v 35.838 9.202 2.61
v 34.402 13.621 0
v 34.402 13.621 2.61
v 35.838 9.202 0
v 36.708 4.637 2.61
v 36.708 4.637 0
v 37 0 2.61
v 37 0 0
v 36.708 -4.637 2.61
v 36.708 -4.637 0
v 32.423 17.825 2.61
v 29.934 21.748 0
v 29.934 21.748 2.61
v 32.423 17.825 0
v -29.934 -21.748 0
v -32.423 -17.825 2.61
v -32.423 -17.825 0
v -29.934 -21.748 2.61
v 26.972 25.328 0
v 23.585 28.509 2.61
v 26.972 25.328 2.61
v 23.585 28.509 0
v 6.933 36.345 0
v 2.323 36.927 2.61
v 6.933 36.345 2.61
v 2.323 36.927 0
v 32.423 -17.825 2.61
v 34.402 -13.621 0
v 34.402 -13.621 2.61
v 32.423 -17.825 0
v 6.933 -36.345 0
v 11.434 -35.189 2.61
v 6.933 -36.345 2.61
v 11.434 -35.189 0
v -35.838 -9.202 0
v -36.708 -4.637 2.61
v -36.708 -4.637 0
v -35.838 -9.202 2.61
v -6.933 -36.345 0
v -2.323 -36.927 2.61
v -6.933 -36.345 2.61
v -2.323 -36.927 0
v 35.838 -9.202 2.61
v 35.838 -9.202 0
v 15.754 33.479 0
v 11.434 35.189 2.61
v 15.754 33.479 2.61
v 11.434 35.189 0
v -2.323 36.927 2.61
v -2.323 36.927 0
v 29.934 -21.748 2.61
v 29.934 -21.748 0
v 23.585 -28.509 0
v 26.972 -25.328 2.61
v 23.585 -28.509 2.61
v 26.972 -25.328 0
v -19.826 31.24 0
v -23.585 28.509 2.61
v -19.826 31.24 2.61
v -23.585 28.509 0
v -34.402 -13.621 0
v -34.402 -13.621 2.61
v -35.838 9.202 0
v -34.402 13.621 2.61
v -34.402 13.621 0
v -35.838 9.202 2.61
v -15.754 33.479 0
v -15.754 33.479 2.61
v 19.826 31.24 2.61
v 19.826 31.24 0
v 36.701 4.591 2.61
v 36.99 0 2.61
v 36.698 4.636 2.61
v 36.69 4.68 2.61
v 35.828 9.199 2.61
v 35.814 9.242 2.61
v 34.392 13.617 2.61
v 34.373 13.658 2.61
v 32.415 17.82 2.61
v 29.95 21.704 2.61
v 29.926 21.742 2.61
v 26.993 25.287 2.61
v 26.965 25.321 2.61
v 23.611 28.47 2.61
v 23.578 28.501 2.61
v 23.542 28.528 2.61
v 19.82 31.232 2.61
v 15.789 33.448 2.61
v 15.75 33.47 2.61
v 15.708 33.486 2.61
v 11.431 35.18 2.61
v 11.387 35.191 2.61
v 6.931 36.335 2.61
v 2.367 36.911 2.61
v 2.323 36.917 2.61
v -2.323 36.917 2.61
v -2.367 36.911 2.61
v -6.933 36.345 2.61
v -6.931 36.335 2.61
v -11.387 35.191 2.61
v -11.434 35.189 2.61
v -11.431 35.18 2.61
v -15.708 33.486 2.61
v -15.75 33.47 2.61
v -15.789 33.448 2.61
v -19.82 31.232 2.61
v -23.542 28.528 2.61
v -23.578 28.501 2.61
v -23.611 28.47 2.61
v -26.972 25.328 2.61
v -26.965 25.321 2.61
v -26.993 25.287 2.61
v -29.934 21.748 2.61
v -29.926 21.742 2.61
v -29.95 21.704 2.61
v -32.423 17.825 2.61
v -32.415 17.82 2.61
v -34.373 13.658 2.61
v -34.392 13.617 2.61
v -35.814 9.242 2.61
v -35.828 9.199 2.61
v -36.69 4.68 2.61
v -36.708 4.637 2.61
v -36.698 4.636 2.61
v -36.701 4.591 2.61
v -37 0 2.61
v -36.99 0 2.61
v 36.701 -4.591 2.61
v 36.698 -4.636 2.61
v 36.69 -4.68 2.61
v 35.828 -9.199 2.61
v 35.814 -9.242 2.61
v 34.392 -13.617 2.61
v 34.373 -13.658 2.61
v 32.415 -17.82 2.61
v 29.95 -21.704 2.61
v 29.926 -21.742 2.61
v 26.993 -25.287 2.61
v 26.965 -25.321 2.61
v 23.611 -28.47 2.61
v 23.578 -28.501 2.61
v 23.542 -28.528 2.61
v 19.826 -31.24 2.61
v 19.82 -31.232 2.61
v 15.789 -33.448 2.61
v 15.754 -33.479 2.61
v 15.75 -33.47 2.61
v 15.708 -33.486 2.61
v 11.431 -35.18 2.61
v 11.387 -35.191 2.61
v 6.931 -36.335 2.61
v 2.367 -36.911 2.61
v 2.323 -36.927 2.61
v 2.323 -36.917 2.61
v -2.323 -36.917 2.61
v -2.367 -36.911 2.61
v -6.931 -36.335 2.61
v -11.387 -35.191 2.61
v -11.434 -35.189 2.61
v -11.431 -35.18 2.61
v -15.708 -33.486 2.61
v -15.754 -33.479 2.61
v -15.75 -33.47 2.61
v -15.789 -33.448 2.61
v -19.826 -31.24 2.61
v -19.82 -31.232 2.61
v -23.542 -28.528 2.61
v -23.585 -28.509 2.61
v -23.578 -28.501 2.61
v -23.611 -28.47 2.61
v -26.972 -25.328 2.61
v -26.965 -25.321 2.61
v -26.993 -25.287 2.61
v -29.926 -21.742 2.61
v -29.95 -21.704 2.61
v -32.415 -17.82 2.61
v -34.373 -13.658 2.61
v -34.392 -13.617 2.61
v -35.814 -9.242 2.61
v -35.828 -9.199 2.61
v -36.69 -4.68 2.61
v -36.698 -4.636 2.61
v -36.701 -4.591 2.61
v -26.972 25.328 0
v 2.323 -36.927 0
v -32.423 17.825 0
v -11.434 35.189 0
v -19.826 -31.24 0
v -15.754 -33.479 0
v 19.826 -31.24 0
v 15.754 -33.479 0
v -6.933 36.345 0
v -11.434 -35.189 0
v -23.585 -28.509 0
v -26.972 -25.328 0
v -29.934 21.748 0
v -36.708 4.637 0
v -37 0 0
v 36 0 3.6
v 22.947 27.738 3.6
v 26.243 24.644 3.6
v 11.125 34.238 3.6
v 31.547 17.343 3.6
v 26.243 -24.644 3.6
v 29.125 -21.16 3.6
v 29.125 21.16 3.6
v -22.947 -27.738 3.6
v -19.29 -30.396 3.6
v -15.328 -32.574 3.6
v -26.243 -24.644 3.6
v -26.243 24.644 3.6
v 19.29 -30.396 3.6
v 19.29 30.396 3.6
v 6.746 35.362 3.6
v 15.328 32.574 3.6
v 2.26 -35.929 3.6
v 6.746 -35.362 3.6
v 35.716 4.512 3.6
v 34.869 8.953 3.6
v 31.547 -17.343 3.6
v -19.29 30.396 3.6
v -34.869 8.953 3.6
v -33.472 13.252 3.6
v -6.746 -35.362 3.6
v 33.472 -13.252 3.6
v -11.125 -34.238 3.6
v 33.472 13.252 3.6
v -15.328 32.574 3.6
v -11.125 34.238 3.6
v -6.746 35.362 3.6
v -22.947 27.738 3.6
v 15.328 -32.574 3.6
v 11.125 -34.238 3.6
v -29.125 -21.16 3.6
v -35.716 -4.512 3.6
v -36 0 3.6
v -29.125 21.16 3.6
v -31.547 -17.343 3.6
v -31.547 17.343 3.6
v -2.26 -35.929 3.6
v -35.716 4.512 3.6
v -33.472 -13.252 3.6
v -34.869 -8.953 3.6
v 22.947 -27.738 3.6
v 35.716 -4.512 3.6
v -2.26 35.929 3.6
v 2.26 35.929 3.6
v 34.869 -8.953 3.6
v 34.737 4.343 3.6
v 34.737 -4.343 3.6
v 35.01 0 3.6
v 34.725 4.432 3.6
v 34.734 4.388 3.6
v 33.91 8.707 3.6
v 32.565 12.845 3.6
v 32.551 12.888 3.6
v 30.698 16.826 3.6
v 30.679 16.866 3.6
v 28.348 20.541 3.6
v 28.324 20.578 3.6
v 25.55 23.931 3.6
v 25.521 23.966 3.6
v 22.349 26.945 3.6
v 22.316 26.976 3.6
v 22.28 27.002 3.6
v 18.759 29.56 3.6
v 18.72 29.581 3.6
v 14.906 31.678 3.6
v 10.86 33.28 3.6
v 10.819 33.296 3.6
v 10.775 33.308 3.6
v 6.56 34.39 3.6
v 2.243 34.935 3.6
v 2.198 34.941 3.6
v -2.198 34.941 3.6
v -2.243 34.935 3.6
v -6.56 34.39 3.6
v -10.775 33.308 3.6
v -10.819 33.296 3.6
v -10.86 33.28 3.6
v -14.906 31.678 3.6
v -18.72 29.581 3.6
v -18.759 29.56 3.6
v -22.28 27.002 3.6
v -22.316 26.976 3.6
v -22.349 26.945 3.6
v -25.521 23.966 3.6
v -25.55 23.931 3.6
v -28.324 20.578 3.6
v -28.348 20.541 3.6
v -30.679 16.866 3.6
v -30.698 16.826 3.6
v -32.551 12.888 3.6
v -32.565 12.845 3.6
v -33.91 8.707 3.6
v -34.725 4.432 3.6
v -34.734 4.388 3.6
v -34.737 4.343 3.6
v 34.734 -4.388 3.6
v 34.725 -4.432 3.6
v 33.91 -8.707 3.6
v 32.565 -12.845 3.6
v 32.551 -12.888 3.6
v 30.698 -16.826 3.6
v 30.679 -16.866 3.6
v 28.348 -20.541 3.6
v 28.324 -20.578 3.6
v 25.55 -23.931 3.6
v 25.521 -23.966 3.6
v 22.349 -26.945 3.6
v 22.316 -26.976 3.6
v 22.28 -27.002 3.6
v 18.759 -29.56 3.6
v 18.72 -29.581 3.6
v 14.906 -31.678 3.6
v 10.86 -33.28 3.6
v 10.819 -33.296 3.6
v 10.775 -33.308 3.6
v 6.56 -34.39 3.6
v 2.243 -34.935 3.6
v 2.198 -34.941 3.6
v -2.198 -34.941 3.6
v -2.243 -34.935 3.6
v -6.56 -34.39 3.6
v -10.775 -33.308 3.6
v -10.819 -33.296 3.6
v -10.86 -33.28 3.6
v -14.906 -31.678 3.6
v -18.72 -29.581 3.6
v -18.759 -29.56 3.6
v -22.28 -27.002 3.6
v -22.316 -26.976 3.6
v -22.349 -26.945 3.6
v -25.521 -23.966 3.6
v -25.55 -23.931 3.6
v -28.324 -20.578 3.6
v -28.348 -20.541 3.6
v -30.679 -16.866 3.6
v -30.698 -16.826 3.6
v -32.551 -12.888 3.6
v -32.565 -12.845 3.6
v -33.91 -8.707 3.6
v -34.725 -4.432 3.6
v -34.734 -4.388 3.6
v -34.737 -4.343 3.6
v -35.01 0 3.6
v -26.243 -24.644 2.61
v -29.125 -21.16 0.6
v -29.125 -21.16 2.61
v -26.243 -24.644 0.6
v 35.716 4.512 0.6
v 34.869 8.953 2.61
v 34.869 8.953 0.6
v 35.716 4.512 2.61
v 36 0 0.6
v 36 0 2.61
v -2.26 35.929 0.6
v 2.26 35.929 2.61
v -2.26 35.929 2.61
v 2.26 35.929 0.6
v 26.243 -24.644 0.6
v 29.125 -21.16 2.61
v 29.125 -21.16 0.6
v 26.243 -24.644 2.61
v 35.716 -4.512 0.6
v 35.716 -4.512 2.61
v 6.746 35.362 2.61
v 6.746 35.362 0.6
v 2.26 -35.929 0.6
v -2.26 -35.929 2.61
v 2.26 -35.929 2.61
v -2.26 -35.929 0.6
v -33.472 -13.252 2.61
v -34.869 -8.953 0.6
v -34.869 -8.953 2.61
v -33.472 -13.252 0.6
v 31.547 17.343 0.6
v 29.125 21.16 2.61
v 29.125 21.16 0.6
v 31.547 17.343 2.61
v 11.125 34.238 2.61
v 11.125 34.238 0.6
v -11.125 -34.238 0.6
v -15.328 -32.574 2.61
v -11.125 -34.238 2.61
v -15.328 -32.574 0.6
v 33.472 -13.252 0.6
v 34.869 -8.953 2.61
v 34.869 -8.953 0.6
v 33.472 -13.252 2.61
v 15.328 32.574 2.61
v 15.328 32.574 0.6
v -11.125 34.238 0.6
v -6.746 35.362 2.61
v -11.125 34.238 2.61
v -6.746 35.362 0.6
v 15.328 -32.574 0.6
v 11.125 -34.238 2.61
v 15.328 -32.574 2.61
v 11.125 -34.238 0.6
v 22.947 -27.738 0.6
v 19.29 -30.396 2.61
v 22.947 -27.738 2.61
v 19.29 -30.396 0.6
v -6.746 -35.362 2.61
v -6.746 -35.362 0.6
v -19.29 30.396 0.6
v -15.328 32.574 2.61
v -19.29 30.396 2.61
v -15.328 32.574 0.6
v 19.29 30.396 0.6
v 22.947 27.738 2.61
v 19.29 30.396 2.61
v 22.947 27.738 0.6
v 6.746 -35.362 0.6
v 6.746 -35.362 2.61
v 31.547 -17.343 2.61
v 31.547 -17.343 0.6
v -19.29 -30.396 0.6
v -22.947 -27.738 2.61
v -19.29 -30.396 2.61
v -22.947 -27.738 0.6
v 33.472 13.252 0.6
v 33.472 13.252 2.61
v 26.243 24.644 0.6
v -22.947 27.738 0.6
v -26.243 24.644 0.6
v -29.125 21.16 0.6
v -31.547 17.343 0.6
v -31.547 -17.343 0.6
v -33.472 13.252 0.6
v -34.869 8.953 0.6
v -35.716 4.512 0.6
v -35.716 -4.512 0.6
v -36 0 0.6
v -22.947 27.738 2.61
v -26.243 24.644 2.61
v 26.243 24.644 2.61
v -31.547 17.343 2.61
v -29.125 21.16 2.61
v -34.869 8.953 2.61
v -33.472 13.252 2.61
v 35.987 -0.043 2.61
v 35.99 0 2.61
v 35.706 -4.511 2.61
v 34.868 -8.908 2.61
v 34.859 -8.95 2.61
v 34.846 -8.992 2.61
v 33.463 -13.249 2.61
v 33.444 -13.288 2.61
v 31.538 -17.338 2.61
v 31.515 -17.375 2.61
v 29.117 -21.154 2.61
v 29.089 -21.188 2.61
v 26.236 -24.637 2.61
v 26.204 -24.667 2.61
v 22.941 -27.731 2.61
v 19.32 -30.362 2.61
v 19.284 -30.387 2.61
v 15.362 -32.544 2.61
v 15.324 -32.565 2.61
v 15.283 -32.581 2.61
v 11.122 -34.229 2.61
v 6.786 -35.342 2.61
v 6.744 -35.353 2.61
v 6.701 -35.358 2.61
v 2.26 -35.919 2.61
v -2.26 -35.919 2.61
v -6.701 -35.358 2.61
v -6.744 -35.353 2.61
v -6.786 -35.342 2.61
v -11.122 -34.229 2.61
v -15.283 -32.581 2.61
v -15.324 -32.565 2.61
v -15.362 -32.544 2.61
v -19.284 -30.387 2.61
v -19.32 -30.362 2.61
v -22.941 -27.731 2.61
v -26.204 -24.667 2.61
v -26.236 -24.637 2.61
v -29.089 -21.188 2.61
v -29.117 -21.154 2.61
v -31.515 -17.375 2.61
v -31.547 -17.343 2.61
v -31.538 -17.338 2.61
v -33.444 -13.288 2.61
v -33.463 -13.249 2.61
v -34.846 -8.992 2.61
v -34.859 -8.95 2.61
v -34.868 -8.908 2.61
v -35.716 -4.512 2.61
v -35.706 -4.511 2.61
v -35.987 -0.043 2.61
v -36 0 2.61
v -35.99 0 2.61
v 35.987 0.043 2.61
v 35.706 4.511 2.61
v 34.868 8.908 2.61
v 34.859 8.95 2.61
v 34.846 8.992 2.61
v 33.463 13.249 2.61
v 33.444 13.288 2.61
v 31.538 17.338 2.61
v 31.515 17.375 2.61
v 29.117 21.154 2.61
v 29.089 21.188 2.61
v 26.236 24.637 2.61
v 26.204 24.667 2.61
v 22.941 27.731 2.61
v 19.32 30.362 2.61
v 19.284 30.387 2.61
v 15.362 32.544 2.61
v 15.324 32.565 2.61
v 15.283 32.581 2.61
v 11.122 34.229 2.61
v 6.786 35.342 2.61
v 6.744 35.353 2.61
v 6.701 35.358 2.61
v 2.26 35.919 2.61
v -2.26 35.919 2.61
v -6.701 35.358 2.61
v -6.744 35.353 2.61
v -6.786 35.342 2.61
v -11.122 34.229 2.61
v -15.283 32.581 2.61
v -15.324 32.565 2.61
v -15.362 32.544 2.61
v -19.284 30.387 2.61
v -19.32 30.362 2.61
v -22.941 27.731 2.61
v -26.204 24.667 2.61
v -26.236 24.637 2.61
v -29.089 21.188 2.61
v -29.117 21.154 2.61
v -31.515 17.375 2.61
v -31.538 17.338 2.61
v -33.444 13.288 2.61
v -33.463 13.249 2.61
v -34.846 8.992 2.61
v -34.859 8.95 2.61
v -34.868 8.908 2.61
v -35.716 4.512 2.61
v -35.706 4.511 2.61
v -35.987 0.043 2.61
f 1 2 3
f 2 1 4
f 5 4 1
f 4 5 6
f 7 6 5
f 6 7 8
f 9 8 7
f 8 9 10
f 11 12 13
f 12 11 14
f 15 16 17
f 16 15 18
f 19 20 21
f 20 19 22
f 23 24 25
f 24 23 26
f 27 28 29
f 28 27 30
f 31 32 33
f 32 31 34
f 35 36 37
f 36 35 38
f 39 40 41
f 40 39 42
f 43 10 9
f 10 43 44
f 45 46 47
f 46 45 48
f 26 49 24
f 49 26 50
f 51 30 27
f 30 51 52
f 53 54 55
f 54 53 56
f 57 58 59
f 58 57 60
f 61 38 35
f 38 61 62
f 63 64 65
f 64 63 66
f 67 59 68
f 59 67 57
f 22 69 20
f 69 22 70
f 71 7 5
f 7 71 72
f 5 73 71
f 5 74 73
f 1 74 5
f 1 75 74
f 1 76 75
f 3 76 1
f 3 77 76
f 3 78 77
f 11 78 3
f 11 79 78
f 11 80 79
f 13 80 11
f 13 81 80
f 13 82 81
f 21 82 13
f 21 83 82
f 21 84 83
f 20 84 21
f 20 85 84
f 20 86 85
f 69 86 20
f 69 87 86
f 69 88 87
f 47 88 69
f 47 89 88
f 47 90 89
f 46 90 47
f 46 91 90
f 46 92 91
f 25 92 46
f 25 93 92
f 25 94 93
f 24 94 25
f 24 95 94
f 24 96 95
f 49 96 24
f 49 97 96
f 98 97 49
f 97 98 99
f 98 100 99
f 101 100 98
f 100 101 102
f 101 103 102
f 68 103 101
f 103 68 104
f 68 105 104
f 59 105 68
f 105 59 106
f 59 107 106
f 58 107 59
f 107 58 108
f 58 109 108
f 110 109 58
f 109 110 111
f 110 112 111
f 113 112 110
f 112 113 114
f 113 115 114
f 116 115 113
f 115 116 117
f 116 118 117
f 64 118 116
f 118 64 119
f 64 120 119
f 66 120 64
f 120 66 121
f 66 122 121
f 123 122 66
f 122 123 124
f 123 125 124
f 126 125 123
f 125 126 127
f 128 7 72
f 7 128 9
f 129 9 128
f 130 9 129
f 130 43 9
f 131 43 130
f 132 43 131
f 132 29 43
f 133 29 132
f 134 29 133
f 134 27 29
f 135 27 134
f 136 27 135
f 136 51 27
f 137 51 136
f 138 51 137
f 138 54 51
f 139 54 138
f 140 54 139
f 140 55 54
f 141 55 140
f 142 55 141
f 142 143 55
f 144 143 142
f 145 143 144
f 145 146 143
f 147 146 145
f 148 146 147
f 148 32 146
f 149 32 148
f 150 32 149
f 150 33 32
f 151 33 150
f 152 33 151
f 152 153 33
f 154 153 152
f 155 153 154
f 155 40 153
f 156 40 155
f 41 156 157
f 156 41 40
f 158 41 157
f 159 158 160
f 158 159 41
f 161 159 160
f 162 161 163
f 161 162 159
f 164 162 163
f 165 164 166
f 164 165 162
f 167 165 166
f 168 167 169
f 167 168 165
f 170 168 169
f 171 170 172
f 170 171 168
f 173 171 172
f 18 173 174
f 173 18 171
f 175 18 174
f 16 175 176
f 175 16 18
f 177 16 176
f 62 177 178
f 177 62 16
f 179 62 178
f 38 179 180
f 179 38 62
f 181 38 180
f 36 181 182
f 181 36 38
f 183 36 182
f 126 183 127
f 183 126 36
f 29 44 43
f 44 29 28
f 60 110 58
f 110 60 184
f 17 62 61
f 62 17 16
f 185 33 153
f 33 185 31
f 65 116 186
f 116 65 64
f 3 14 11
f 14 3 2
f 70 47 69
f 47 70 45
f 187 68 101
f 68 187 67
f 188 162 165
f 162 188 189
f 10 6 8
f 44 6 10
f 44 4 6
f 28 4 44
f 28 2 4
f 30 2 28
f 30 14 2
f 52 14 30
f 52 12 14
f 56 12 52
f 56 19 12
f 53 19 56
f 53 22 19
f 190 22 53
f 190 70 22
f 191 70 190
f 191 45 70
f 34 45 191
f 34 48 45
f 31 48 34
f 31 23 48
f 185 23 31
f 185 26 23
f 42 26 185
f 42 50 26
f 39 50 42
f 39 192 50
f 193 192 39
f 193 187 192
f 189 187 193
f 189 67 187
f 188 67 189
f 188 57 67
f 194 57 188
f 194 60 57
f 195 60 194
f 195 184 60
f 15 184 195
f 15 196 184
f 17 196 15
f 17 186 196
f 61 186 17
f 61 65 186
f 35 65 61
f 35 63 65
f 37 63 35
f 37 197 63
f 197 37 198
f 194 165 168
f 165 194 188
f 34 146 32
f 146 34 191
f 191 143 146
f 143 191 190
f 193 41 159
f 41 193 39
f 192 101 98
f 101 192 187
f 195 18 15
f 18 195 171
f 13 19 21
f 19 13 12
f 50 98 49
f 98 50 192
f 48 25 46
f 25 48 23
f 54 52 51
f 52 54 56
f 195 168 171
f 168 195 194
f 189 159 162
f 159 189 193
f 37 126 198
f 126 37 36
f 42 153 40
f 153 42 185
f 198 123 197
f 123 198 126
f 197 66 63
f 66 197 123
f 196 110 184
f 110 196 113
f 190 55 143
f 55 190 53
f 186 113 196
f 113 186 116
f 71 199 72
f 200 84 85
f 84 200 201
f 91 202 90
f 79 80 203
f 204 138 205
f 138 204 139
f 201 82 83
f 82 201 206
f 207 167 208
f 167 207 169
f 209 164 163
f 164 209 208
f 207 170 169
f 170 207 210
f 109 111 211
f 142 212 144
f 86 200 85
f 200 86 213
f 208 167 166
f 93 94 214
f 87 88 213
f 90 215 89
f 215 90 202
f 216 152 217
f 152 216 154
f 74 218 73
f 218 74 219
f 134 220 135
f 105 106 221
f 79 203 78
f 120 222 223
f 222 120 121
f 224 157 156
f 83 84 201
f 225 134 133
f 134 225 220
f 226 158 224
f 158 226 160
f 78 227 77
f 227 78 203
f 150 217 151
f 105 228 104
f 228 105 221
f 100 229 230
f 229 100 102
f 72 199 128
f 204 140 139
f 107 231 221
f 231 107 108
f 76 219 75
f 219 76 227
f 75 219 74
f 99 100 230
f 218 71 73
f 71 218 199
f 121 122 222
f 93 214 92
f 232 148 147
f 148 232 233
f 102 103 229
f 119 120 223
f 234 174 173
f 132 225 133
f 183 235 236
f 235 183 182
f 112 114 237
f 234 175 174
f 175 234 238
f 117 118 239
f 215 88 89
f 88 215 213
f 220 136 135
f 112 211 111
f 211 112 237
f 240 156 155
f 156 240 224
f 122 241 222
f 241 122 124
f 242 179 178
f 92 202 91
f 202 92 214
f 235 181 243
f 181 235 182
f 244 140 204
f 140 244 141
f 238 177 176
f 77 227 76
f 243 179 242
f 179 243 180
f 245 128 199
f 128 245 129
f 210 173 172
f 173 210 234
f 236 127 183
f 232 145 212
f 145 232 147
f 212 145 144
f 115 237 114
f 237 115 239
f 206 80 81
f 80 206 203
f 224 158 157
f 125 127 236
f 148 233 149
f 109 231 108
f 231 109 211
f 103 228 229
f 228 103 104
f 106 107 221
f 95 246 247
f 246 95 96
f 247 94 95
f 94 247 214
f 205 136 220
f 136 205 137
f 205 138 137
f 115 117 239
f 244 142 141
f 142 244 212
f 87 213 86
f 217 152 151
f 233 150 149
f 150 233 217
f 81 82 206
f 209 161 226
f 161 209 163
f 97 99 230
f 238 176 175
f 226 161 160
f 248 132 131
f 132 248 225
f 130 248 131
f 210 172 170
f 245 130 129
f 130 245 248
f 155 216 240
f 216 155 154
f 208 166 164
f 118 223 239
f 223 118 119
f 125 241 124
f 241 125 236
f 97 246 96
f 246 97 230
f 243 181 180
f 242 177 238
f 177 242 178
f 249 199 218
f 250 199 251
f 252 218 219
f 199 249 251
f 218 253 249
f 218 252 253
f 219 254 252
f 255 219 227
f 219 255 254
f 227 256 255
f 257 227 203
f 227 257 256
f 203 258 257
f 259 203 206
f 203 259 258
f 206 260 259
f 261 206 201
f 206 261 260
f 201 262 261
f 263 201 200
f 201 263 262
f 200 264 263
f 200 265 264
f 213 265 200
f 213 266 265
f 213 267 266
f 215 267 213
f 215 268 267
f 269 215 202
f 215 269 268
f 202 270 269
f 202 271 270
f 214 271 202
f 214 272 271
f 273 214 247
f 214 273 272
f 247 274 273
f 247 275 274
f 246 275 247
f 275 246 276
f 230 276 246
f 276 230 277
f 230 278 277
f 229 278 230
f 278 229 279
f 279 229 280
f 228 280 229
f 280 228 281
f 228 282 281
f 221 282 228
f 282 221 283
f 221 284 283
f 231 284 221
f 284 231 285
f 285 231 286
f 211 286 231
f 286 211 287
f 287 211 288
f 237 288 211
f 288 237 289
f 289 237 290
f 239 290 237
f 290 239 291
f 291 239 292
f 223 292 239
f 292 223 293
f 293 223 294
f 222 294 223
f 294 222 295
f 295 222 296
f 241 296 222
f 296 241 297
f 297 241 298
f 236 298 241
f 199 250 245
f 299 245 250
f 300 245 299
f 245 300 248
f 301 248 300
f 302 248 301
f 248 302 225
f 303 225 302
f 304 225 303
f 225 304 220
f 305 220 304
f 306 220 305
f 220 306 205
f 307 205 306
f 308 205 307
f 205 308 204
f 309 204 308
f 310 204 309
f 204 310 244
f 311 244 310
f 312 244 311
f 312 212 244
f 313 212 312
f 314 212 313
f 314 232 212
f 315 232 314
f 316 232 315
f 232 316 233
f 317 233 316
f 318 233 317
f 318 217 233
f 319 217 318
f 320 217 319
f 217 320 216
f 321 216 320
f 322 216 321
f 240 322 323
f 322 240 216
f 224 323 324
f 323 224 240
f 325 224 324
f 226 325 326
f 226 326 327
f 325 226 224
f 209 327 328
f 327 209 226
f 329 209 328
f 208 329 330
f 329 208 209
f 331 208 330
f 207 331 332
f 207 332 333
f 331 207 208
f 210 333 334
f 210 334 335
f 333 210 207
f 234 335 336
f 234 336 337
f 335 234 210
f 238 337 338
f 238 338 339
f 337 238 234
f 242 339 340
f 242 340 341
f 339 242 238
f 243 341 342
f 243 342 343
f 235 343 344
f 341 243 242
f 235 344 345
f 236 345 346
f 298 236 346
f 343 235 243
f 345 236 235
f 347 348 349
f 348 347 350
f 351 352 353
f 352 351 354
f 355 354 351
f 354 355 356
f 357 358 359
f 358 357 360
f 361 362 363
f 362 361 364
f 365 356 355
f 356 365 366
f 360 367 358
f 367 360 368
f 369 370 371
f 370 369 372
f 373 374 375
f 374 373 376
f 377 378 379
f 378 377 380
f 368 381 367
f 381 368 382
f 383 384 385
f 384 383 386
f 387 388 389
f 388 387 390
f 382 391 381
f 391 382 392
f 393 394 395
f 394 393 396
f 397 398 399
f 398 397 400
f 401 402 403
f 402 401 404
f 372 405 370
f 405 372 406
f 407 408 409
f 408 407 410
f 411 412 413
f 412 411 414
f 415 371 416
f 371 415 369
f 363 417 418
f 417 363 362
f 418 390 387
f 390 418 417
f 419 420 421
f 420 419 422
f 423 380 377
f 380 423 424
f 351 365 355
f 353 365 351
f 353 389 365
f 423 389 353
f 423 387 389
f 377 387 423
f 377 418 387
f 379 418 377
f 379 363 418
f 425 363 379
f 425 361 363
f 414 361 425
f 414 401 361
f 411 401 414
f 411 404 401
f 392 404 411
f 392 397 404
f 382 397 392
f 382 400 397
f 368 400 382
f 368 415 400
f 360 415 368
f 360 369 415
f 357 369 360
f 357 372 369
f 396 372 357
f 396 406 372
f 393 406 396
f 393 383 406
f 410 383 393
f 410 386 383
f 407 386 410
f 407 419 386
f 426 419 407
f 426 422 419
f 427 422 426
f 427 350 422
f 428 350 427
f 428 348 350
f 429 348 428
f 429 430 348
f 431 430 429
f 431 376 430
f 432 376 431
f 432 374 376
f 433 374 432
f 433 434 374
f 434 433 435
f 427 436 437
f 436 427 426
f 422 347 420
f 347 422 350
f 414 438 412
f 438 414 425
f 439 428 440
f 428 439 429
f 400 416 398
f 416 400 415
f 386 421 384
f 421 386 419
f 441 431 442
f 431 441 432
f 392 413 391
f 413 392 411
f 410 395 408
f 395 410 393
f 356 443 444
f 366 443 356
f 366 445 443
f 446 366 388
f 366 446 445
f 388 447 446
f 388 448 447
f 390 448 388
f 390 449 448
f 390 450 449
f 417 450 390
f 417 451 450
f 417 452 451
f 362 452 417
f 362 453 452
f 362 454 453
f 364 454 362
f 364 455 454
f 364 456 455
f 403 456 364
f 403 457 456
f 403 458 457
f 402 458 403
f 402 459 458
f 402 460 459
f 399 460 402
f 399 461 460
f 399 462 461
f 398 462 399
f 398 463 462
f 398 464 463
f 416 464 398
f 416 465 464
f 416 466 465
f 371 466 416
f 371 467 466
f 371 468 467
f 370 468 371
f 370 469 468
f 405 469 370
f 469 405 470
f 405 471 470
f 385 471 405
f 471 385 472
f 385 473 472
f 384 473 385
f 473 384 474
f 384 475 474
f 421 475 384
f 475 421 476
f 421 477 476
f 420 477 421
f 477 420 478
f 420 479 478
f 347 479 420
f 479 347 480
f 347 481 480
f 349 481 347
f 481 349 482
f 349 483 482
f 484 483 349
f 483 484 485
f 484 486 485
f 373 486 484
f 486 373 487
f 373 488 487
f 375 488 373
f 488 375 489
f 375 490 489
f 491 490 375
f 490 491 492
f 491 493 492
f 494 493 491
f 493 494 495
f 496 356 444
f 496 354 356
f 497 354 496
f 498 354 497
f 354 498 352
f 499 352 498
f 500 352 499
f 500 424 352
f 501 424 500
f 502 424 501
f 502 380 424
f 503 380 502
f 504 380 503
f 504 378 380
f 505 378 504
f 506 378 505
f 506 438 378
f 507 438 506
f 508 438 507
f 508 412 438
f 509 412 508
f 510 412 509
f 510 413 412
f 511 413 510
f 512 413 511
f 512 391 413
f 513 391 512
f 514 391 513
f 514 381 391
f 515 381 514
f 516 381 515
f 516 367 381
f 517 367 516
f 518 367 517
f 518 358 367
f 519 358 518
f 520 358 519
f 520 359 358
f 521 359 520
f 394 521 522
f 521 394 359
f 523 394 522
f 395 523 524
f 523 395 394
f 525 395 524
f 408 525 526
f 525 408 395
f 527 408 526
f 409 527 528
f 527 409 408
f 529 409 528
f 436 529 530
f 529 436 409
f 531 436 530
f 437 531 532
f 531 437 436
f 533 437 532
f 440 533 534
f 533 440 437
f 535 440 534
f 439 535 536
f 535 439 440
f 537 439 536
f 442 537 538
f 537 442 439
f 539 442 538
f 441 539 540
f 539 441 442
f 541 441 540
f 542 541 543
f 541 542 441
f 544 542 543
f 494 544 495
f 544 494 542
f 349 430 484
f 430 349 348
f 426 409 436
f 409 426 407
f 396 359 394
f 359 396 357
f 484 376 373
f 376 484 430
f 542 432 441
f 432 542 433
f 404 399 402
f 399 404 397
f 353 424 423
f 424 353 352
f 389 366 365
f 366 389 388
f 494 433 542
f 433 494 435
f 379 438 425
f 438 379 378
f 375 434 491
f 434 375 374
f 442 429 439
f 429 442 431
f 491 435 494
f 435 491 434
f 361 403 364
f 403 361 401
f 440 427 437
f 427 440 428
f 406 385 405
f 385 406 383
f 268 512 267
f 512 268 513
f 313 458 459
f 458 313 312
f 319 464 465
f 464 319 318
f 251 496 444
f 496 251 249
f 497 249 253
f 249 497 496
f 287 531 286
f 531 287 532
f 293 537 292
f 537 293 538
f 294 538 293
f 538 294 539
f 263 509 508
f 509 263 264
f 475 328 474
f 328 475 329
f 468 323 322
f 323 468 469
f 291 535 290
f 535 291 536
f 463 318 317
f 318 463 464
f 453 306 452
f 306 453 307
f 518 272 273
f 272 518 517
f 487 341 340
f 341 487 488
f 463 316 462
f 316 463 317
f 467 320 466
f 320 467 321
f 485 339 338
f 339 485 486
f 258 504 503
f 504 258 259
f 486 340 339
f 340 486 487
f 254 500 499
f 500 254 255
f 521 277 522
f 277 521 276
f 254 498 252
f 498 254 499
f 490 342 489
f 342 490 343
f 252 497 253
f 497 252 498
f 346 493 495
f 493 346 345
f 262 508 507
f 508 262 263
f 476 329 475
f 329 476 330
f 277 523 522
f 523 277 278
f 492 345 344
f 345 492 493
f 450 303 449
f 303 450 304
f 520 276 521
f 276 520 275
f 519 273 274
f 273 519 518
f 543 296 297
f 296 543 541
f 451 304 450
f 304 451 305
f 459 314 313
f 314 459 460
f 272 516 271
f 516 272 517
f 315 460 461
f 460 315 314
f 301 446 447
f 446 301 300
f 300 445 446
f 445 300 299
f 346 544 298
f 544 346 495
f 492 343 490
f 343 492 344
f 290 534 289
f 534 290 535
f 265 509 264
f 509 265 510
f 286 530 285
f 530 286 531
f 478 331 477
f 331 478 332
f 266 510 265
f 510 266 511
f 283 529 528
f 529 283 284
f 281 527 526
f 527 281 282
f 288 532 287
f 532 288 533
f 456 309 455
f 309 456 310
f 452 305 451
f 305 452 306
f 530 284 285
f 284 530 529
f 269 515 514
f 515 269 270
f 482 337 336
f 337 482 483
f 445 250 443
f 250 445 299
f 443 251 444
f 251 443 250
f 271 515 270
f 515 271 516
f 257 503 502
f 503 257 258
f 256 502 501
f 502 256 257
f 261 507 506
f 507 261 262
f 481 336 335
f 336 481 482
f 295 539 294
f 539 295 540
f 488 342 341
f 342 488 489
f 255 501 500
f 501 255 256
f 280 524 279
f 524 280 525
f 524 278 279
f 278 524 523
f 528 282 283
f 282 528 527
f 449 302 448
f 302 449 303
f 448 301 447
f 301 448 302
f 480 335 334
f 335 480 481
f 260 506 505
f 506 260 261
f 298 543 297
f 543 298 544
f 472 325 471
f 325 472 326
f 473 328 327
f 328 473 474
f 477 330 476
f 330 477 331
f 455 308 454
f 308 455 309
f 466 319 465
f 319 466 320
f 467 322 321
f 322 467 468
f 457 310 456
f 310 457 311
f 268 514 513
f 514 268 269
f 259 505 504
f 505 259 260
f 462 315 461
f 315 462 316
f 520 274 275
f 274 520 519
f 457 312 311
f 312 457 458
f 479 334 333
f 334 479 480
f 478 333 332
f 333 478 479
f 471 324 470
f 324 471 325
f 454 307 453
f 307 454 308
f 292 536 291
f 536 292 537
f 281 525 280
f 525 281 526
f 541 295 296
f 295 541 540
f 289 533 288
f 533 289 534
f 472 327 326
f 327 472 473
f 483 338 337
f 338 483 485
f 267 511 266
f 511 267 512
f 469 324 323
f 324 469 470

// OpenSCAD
//Total diameter of the cup including the lip
cup_diameter = 72;	

//The thickness of the cup lip.
lip_height = 2;

//The thickness of the printed lid.		
lid_thickness = 0.6;	

/* [Hidden] */

$fn=50;

cup_radius = cup_diameter / 2;
difference()
{
	union()
	{
	
		cylinder(h = lip_height + lid_thickness + 0.01, r1 = cup_radius + 1, r2 = cup_radius + 1, center = false);
		
		translate ([0,0,lip_height + lid_thickness])
		{
			cylinder(h = 1, r1 = cup_radius + 1, r2 = cup_radius, center = false);
		}
	}

	union()
	{
		translate ([0,0,lid_thickness])
		{
			cylinder(h = lip_height+0.01, r1 = cup_radius, r2 = cup_radius, center = false);
		}
		translate ([0,0,lid_thickness + lip_height])
		{
			cylinder(h = 1.01, r1 = cup_radius, r2 = cup_radius-1, center = false);
		}
	}
}
